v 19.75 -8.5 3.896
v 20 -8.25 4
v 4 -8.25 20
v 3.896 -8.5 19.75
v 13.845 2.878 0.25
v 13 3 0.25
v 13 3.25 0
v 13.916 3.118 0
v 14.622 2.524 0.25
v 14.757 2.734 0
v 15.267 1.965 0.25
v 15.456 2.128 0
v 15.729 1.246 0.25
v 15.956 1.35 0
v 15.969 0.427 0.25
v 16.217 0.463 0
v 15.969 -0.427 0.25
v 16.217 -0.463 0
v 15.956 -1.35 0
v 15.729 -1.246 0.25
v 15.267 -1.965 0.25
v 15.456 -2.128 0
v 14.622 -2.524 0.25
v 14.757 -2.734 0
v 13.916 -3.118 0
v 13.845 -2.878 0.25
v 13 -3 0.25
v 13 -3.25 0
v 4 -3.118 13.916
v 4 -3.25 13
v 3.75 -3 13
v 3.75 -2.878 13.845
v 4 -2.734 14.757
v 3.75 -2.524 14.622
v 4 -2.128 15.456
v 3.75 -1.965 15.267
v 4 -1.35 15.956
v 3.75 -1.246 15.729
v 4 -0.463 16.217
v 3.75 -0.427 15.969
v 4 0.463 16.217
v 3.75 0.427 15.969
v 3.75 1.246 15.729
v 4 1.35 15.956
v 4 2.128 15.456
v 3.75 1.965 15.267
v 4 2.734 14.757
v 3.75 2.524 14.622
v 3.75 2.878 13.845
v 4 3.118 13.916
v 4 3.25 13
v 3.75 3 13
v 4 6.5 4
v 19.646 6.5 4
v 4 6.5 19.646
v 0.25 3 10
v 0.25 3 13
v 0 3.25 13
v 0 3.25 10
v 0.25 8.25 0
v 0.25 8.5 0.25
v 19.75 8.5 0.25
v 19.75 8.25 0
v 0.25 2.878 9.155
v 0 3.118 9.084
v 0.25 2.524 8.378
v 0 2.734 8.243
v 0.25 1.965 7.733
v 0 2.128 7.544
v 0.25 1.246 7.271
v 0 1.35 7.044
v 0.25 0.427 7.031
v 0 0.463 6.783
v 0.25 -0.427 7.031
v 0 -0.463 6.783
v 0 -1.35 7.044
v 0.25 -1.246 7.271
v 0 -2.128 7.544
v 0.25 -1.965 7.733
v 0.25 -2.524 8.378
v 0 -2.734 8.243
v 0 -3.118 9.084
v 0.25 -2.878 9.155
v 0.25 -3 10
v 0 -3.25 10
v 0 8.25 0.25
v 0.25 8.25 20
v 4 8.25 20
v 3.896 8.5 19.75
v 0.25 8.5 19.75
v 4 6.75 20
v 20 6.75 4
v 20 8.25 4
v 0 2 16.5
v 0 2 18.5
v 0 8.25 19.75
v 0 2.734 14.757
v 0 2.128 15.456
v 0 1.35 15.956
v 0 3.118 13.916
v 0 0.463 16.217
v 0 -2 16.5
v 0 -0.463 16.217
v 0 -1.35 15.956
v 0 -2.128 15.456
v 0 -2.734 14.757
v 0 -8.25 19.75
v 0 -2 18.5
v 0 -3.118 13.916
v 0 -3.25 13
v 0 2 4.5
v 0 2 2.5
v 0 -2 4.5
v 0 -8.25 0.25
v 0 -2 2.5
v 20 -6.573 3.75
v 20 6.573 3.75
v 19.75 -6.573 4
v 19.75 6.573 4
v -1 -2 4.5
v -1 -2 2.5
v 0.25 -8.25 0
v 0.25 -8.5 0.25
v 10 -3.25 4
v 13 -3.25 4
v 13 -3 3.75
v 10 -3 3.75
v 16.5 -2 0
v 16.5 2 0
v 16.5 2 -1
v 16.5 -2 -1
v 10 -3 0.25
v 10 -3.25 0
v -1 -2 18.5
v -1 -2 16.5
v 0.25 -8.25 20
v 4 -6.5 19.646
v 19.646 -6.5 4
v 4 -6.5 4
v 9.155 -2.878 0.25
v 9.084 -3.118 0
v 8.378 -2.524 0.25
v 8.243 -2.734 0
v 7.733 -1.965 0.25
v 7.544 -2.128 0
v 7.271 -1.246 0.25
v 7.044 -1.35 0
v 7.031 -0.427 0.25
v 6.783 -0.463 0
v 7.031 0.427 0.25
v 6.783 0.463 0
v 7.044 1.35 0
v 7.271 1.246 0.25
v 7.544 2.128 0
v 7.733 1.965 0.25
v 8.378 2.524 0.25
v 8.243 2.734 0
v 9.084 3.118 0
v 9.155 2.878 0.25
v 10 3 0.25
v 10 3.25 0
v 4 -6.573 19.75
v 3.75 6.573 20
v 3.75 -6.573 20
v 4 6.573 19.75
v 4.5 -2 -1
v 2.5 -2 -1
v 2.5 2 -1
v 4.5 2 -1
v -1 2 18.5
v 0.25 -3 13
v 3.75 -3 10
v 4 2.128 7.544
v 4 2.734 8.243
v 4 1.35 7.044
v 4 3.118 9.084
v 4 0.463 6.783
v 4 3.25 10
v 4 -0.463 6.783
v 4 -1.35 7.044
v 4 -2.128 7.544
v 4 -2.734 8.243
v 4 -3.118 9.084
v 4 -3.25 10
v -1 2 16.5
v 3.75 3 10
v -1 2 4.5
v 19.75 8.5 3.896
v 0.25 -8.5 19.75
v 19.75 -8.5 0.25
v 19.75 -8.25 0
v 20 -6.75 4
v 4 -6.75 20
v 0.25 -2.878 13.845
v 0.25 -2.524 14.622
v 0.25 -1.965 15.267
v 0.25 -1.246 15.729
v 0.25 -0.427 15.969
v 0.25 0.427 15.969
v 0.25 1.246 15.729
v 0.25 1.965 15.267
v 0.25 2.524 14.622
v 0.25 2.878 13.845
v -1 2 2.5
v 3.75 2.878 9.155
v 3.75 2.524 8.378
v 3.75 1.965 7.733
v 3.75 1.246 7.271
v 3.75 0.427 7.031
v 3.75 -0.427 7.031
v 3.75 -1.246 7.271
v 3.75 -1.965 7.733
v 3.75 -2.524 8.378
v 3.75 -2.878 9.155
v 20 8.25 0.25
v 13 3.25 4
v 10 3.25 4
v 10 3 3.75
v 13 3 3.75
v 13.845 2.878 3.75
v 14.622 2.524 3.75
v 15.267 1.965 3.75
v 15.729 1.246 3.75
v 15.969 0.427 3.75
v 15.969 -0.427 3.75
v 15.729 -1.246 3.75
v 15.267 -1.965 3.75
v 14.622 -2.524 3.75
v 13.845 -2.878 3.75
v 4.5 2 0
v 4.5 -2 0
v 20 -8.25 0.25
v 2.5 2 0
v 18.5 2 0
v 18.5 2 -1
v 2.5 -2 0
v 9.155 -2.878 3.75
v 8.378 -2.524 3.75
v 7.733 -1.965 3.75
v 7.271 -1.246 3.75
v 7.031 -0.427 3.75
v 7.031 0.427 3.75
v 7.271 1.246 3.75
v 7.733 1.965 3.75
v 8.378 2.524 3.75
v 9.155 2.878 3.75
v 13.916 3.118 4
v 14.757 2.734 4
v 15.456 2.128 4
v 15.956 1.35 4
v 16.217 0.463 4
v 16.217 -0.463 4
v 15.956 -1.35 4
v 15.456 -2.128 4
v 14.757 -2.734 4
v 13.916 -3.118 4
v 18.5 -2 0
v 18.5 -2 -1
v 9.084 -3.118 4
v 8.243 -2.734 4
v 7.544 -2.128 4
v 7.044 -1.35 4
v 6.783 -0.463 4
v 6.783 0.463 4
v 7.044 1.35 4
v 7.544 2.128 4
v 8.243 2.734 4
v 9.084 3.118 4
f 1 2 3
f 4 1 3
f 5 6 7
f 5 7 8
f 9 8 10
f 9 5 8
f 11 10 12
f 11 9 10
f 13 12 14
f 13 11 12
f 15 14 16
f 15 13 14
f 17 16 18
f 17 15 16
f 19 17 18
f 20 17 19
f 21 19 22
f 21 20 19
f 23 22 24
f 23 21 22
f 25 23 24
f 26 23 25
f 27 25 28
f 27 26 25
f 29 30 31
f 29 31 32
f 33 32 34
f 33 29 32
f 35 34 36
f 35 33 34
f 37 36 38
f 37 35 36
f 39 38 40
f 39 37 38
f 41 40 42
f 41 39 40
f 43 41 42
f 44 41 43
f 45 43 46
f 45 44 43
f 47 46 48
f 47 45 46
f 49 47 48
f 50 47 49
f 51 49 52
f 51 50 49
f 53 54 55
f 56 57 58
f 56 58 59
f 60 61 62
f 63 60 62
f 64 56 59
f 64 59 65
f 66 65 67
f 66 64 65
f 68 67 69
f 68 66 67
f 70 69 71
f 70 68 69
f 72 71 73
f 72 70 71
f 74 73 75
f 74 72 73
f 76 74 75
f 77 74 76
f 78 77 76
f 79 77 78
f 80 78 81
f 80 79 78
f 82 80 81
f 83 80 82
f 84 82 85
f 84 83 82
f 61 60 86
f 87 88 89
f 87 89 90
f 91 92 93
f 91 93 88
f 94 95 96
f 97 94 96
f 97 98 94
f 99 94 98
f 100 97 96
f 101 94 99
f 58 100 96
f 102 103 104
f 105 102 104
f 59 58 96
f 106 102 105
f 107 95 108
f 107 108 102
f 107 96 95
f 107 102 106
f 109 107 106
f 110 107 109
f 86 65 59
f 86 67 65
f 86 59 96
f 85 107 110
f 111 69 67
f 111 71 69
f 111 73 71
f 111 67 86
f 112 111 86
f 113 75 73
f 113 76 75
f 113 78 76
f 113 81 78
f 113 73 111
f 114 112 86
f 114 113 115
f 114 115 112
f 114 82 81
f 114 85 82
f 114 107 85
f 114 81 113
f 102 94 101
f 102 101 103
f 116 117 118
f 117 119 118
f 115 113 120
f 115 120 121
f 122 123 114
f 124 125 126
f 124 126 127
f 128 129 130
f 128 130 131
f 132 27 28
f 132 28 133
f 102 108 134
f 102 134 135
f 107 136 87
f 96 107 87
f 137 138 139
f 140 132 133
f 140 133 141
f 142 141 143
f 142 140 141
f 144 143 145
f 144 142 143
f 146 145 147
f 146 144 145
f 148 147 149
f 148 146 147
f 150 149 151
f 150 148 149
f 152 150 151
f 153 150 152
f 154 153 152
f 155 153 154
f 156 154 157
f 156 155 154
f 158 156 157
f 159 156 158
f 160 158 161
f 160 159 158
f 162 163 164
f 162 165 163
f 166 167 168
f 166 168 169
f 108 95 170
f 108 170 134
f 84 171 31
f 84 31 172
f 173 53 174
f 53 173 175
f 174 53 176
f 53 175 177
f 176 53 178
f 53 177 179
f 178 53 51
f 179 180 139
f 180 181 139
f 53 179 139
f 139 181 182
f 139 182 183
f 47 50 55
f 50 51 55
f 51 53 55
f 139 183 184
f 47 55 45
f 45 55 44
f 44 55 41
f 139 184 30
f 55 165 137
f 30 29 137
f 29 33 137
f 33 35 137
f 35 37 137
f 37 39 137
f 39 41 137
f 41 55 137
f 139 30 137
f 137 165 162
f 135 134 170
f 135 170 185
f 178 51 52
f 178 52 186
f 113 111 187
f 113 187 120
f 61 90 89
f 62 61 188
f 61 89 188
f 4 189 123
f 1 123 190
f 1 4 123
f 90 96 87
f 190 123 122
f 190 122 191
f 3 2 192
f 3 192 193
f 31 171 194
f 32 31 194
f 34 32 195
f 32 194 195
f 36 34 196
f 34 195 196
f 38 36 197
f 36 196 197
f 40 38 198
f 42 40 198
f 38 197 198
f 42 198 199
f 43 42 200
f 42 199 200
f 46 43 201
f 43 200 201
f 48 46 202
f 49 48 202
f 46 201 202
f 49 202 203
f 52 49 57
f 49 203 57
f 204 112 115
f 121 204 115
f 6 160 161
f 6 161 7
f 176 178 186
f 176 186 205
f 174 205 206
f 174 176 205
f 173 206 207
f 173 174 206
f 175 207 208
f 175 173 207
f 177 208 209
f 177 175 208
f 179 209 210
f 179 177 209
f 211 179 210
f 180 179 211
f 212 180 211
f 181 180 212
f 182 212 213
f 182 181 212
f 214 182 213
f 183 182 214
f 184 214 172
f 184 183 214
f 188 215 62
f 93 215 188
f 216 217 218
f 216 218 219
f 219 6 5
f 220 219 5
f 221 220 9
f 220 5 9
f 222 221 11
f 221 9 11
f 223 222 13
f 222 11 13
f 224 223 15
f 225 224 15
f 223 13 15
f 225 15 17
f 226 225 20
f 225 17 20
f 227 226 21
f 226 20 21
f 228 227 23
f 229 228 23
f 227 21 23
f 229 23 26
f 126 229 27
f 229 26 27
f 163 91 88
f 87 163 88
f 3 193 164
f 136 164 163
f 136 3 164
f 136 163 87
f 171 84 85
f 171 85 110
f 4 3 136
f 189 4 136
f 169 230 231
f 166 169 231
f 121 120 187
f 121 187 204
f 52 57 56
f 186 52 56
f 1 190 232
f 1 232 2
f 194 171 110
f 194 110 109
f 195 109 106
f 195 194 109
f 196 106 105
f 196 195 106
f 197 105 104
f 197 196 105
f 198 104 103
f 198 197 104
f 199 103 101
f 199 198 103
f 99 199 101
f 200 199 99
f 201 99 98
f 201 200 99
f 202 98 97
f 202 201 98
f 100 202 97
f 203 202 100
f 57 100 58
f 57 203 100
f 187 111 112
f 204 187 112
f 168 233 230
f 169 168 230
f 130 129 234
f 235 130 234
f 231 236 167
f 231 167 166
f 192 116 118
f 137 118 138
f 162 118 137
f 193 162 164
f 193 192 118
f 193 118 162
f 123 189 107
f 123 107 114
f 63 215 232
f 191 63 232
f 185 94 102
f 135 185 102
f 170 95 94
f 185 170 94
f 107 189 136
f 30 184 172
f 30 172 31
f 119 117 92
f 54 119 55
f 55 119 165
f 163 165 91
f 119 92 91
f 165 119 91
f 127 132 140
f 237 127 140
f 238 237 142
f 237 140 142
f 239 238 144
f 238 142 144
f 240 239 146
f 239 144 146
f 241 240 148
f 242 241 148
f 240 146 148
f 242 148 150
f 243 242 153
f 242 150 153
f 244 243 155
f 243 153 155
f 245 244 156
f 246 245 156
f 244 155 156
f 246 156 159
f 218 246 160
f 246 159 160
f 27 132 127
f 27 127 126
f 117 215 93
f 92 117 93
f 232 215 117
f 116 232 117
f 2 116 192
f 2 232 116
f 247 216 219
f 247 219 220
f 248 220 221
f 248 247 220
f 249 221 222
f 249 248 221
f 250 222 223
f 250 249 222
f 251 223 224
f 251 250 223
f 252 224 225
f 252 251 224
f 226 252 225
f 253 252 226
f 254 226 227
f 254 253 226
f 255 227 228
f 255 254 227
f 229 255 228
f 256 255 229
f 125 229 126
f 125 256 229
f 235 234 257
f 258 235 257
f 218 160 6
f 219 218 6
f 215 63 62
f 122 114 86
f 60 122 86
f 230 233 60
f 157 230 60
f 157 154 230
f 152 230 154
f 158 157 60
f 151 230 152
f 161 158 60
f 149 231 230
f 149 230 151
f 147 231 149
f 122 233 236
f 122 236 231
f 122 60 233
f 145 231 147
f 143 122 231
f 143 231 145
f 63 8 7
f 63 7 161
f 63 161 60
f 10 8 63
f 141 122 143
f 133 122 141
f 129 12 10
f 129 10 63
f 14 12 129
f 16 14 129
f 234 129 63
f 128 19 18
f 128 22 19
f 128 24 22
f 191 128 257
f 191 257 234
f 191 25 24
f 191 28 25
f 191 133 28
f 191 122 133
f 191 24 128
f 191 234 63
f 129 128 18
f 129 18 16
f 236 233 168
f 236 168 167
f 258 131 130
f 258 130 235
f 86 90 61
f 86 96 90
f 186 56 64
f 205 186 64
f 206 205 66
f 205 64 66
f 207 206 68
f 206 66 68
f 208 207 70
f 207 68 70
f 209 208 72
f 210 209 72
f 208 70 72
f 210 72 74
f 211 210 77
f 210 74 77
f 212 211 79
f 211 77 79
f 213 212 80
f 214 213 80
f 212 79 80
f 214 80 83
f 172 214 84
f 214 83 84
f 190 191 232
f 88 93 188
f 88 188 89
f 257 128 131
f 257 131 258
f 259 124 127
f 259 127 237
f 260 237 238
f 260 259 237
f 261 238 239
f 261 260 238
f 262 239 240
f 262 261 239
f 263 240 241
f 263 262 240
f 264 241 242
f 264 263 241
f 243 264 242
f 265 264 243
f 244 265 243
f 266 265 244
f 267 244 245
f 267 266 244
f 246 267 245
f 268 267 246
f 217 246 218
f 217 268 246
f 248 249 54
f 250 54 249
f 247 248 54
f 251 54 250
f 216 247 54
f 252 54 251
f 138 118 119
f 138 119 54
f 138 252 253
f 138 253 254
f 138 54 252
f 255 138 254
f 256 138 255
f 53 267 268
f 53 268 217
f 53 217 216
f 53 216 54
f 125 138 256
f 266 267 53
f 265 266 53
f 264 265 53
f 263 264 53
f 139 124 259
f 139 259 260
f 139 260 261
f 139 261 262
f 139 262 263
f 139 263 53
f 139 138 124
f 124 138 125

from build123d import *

# Parameters (mm, degrees)
PAD_DEPTH       = 8.5
SKETCH001_W     = 16
SKETCH001_H     = 13
POCKET_DEPTH    = 16
POCKET001_DEPTH = 5
POCKET002_DEPTH = 5
SKETCH004_W     = 2
SKETCH004_H     = 4
PAD001_DEPTH    = 1
SKETCH005_W     = 2
SKETCH005_H     = 4
PAD002_DEPTH    = 1
CHAMFER_SIZE    = 0.25
CHAMFER001_SIZE = 0.25
CHAMFER002_SIZE = 0.25


with BuildPart() as part:
    # Sketch → Pad (new body, symmetric)
    with BuildSketch(Plane.XZ):
        Polygon((0, 0), (20, 0), (20, 4), (4, 20), (0, 20), align=None)
    extrude(amount=PAD_DEPTH, both=True)

    # Sketch001 (on Face4 of Pad) → Pocket (cut)
    with BuildSketch(Plane(origin=(0, 0, 20), x_dir=(-1, 0, 0), z_dir=(0, 0, 1))):
        with Locations((-12, 0)):
            Rectangle(SKETCH001_W, SKETCH001_H)
    extrude(amount=-POCKET_DEPTH, mode=Mode.SUBTRACT)

    # Sketch002 (on Face2 of Pocket) → Pocket001 (cut)
    with BuildSketch(Plane(origin=(0, 0, 0), x_dir=(0, 0, -1), z_dir=(-1, 0, 0))):
        with BuildLine():
            ThreePointArc((-13, 3), (-16, 0), (-13, -3))
            Line((-13, -3), (-10, -3))
            ThreePointArc((-10, -3), (-7, 0), (-10, 3))
            Line((-13, 3), (-10, 3))
        make_face()
    extrude(amount=-POCKET001_DEPTH, mode=Mode.SUBTRACT)

    # Sketch003 (on Face1 of Pocket001) → Pocket002 (cut)
    with BuildSketch(Plane(origin=(0, 0, 0), x_dir=(1, 0, 0), z_dir=(0, 0, -1))):
        with BuildLine():
            ThreePointArc((10, 3), (7, 0), (10, -3))
            Line((10, -3), (13, -3))
            ThreePointArc((13, -3), (16, 0), (13, 3))
            Line((10, 3), (13, 3))
        make_face()
    extrude(amount=-POCKET002_DEPTH, mode=Mode.SUBTRACT)

    # Sketch004 (on Face1 of Pocket002) → Pad001 (join)
    with BuildSketch(Plane(origin=(0, 0, 0), x_dir=(1, 0, 0), z_dir=(0, 0, -1))):
        with Locations((3.5, 0)):
            Rectangle(SKETCH004_W, SKETCH004_H)
        with Locations((17.5, 0)):
            Rectangle(SKETCH004_W, SKETCH004_H)
    extrude(amount=PAD001_DEPTH)

    # Sketch005 (on Face2 of Pad001) → Pad002 (join)
    with BuildSketch(Plane(origin=(0, 0, 0), x_dir=(0, 0, -1), z_dir=(-1, 0, 0))):
        with Locations((-17.5, 0)):
            Rectangle(SKETCH005_W, SKETCH005_H)
        with Locations((-3.5, 0)):
            Rectangle(SKETCH005_W, SKETCH005_H)
    extrude(amount=PAD002_DEPTH)

    # Chamfer
    chamfer_edges = [part.edges().sort_by_distance(p)[0] for p in [
        (2, -8.5, 20),
        (0, -8.5, 10),
        (10, -8.5, 0),
        (0, 0, 0),
        (10, 8.5, 0),
        (0, 8.5, 10),
        (20, 0, 0),
        (20, 8.5, 2),
        (20, -8.5, 2),
        (16, 0, 4),
        (16, 0, 0),
        (0, 0, 7),
        (0, 0, 20),
        (2, 8.5, 20),
        (12, -8.5, 12),
        (12, 8.5, 12),
        (20, 0, 4),
        (4, 0, 16),
        (4, 0, 20),
    ]]
    chamfer(chamfer_edges, length=CHAMFER_SIZE)

    # Chamfer001
    chamfer001_edges = [part.edges().sort_by_distance(p)[0] for p in [
        (12, -6.5, 12),
    ]]
    chamfer(chamfer001_edges, length=CHAMFER001_SIZE)

    # Chamfer002
    chamfer002_edges = [part.edges().sort_by_distance(p)[0] for p in [
        (12, 6.5, 12),
    ]]
    chamfer(chamfer002_edges, length=CHAMFER002_SIZE)


solid = part.part
